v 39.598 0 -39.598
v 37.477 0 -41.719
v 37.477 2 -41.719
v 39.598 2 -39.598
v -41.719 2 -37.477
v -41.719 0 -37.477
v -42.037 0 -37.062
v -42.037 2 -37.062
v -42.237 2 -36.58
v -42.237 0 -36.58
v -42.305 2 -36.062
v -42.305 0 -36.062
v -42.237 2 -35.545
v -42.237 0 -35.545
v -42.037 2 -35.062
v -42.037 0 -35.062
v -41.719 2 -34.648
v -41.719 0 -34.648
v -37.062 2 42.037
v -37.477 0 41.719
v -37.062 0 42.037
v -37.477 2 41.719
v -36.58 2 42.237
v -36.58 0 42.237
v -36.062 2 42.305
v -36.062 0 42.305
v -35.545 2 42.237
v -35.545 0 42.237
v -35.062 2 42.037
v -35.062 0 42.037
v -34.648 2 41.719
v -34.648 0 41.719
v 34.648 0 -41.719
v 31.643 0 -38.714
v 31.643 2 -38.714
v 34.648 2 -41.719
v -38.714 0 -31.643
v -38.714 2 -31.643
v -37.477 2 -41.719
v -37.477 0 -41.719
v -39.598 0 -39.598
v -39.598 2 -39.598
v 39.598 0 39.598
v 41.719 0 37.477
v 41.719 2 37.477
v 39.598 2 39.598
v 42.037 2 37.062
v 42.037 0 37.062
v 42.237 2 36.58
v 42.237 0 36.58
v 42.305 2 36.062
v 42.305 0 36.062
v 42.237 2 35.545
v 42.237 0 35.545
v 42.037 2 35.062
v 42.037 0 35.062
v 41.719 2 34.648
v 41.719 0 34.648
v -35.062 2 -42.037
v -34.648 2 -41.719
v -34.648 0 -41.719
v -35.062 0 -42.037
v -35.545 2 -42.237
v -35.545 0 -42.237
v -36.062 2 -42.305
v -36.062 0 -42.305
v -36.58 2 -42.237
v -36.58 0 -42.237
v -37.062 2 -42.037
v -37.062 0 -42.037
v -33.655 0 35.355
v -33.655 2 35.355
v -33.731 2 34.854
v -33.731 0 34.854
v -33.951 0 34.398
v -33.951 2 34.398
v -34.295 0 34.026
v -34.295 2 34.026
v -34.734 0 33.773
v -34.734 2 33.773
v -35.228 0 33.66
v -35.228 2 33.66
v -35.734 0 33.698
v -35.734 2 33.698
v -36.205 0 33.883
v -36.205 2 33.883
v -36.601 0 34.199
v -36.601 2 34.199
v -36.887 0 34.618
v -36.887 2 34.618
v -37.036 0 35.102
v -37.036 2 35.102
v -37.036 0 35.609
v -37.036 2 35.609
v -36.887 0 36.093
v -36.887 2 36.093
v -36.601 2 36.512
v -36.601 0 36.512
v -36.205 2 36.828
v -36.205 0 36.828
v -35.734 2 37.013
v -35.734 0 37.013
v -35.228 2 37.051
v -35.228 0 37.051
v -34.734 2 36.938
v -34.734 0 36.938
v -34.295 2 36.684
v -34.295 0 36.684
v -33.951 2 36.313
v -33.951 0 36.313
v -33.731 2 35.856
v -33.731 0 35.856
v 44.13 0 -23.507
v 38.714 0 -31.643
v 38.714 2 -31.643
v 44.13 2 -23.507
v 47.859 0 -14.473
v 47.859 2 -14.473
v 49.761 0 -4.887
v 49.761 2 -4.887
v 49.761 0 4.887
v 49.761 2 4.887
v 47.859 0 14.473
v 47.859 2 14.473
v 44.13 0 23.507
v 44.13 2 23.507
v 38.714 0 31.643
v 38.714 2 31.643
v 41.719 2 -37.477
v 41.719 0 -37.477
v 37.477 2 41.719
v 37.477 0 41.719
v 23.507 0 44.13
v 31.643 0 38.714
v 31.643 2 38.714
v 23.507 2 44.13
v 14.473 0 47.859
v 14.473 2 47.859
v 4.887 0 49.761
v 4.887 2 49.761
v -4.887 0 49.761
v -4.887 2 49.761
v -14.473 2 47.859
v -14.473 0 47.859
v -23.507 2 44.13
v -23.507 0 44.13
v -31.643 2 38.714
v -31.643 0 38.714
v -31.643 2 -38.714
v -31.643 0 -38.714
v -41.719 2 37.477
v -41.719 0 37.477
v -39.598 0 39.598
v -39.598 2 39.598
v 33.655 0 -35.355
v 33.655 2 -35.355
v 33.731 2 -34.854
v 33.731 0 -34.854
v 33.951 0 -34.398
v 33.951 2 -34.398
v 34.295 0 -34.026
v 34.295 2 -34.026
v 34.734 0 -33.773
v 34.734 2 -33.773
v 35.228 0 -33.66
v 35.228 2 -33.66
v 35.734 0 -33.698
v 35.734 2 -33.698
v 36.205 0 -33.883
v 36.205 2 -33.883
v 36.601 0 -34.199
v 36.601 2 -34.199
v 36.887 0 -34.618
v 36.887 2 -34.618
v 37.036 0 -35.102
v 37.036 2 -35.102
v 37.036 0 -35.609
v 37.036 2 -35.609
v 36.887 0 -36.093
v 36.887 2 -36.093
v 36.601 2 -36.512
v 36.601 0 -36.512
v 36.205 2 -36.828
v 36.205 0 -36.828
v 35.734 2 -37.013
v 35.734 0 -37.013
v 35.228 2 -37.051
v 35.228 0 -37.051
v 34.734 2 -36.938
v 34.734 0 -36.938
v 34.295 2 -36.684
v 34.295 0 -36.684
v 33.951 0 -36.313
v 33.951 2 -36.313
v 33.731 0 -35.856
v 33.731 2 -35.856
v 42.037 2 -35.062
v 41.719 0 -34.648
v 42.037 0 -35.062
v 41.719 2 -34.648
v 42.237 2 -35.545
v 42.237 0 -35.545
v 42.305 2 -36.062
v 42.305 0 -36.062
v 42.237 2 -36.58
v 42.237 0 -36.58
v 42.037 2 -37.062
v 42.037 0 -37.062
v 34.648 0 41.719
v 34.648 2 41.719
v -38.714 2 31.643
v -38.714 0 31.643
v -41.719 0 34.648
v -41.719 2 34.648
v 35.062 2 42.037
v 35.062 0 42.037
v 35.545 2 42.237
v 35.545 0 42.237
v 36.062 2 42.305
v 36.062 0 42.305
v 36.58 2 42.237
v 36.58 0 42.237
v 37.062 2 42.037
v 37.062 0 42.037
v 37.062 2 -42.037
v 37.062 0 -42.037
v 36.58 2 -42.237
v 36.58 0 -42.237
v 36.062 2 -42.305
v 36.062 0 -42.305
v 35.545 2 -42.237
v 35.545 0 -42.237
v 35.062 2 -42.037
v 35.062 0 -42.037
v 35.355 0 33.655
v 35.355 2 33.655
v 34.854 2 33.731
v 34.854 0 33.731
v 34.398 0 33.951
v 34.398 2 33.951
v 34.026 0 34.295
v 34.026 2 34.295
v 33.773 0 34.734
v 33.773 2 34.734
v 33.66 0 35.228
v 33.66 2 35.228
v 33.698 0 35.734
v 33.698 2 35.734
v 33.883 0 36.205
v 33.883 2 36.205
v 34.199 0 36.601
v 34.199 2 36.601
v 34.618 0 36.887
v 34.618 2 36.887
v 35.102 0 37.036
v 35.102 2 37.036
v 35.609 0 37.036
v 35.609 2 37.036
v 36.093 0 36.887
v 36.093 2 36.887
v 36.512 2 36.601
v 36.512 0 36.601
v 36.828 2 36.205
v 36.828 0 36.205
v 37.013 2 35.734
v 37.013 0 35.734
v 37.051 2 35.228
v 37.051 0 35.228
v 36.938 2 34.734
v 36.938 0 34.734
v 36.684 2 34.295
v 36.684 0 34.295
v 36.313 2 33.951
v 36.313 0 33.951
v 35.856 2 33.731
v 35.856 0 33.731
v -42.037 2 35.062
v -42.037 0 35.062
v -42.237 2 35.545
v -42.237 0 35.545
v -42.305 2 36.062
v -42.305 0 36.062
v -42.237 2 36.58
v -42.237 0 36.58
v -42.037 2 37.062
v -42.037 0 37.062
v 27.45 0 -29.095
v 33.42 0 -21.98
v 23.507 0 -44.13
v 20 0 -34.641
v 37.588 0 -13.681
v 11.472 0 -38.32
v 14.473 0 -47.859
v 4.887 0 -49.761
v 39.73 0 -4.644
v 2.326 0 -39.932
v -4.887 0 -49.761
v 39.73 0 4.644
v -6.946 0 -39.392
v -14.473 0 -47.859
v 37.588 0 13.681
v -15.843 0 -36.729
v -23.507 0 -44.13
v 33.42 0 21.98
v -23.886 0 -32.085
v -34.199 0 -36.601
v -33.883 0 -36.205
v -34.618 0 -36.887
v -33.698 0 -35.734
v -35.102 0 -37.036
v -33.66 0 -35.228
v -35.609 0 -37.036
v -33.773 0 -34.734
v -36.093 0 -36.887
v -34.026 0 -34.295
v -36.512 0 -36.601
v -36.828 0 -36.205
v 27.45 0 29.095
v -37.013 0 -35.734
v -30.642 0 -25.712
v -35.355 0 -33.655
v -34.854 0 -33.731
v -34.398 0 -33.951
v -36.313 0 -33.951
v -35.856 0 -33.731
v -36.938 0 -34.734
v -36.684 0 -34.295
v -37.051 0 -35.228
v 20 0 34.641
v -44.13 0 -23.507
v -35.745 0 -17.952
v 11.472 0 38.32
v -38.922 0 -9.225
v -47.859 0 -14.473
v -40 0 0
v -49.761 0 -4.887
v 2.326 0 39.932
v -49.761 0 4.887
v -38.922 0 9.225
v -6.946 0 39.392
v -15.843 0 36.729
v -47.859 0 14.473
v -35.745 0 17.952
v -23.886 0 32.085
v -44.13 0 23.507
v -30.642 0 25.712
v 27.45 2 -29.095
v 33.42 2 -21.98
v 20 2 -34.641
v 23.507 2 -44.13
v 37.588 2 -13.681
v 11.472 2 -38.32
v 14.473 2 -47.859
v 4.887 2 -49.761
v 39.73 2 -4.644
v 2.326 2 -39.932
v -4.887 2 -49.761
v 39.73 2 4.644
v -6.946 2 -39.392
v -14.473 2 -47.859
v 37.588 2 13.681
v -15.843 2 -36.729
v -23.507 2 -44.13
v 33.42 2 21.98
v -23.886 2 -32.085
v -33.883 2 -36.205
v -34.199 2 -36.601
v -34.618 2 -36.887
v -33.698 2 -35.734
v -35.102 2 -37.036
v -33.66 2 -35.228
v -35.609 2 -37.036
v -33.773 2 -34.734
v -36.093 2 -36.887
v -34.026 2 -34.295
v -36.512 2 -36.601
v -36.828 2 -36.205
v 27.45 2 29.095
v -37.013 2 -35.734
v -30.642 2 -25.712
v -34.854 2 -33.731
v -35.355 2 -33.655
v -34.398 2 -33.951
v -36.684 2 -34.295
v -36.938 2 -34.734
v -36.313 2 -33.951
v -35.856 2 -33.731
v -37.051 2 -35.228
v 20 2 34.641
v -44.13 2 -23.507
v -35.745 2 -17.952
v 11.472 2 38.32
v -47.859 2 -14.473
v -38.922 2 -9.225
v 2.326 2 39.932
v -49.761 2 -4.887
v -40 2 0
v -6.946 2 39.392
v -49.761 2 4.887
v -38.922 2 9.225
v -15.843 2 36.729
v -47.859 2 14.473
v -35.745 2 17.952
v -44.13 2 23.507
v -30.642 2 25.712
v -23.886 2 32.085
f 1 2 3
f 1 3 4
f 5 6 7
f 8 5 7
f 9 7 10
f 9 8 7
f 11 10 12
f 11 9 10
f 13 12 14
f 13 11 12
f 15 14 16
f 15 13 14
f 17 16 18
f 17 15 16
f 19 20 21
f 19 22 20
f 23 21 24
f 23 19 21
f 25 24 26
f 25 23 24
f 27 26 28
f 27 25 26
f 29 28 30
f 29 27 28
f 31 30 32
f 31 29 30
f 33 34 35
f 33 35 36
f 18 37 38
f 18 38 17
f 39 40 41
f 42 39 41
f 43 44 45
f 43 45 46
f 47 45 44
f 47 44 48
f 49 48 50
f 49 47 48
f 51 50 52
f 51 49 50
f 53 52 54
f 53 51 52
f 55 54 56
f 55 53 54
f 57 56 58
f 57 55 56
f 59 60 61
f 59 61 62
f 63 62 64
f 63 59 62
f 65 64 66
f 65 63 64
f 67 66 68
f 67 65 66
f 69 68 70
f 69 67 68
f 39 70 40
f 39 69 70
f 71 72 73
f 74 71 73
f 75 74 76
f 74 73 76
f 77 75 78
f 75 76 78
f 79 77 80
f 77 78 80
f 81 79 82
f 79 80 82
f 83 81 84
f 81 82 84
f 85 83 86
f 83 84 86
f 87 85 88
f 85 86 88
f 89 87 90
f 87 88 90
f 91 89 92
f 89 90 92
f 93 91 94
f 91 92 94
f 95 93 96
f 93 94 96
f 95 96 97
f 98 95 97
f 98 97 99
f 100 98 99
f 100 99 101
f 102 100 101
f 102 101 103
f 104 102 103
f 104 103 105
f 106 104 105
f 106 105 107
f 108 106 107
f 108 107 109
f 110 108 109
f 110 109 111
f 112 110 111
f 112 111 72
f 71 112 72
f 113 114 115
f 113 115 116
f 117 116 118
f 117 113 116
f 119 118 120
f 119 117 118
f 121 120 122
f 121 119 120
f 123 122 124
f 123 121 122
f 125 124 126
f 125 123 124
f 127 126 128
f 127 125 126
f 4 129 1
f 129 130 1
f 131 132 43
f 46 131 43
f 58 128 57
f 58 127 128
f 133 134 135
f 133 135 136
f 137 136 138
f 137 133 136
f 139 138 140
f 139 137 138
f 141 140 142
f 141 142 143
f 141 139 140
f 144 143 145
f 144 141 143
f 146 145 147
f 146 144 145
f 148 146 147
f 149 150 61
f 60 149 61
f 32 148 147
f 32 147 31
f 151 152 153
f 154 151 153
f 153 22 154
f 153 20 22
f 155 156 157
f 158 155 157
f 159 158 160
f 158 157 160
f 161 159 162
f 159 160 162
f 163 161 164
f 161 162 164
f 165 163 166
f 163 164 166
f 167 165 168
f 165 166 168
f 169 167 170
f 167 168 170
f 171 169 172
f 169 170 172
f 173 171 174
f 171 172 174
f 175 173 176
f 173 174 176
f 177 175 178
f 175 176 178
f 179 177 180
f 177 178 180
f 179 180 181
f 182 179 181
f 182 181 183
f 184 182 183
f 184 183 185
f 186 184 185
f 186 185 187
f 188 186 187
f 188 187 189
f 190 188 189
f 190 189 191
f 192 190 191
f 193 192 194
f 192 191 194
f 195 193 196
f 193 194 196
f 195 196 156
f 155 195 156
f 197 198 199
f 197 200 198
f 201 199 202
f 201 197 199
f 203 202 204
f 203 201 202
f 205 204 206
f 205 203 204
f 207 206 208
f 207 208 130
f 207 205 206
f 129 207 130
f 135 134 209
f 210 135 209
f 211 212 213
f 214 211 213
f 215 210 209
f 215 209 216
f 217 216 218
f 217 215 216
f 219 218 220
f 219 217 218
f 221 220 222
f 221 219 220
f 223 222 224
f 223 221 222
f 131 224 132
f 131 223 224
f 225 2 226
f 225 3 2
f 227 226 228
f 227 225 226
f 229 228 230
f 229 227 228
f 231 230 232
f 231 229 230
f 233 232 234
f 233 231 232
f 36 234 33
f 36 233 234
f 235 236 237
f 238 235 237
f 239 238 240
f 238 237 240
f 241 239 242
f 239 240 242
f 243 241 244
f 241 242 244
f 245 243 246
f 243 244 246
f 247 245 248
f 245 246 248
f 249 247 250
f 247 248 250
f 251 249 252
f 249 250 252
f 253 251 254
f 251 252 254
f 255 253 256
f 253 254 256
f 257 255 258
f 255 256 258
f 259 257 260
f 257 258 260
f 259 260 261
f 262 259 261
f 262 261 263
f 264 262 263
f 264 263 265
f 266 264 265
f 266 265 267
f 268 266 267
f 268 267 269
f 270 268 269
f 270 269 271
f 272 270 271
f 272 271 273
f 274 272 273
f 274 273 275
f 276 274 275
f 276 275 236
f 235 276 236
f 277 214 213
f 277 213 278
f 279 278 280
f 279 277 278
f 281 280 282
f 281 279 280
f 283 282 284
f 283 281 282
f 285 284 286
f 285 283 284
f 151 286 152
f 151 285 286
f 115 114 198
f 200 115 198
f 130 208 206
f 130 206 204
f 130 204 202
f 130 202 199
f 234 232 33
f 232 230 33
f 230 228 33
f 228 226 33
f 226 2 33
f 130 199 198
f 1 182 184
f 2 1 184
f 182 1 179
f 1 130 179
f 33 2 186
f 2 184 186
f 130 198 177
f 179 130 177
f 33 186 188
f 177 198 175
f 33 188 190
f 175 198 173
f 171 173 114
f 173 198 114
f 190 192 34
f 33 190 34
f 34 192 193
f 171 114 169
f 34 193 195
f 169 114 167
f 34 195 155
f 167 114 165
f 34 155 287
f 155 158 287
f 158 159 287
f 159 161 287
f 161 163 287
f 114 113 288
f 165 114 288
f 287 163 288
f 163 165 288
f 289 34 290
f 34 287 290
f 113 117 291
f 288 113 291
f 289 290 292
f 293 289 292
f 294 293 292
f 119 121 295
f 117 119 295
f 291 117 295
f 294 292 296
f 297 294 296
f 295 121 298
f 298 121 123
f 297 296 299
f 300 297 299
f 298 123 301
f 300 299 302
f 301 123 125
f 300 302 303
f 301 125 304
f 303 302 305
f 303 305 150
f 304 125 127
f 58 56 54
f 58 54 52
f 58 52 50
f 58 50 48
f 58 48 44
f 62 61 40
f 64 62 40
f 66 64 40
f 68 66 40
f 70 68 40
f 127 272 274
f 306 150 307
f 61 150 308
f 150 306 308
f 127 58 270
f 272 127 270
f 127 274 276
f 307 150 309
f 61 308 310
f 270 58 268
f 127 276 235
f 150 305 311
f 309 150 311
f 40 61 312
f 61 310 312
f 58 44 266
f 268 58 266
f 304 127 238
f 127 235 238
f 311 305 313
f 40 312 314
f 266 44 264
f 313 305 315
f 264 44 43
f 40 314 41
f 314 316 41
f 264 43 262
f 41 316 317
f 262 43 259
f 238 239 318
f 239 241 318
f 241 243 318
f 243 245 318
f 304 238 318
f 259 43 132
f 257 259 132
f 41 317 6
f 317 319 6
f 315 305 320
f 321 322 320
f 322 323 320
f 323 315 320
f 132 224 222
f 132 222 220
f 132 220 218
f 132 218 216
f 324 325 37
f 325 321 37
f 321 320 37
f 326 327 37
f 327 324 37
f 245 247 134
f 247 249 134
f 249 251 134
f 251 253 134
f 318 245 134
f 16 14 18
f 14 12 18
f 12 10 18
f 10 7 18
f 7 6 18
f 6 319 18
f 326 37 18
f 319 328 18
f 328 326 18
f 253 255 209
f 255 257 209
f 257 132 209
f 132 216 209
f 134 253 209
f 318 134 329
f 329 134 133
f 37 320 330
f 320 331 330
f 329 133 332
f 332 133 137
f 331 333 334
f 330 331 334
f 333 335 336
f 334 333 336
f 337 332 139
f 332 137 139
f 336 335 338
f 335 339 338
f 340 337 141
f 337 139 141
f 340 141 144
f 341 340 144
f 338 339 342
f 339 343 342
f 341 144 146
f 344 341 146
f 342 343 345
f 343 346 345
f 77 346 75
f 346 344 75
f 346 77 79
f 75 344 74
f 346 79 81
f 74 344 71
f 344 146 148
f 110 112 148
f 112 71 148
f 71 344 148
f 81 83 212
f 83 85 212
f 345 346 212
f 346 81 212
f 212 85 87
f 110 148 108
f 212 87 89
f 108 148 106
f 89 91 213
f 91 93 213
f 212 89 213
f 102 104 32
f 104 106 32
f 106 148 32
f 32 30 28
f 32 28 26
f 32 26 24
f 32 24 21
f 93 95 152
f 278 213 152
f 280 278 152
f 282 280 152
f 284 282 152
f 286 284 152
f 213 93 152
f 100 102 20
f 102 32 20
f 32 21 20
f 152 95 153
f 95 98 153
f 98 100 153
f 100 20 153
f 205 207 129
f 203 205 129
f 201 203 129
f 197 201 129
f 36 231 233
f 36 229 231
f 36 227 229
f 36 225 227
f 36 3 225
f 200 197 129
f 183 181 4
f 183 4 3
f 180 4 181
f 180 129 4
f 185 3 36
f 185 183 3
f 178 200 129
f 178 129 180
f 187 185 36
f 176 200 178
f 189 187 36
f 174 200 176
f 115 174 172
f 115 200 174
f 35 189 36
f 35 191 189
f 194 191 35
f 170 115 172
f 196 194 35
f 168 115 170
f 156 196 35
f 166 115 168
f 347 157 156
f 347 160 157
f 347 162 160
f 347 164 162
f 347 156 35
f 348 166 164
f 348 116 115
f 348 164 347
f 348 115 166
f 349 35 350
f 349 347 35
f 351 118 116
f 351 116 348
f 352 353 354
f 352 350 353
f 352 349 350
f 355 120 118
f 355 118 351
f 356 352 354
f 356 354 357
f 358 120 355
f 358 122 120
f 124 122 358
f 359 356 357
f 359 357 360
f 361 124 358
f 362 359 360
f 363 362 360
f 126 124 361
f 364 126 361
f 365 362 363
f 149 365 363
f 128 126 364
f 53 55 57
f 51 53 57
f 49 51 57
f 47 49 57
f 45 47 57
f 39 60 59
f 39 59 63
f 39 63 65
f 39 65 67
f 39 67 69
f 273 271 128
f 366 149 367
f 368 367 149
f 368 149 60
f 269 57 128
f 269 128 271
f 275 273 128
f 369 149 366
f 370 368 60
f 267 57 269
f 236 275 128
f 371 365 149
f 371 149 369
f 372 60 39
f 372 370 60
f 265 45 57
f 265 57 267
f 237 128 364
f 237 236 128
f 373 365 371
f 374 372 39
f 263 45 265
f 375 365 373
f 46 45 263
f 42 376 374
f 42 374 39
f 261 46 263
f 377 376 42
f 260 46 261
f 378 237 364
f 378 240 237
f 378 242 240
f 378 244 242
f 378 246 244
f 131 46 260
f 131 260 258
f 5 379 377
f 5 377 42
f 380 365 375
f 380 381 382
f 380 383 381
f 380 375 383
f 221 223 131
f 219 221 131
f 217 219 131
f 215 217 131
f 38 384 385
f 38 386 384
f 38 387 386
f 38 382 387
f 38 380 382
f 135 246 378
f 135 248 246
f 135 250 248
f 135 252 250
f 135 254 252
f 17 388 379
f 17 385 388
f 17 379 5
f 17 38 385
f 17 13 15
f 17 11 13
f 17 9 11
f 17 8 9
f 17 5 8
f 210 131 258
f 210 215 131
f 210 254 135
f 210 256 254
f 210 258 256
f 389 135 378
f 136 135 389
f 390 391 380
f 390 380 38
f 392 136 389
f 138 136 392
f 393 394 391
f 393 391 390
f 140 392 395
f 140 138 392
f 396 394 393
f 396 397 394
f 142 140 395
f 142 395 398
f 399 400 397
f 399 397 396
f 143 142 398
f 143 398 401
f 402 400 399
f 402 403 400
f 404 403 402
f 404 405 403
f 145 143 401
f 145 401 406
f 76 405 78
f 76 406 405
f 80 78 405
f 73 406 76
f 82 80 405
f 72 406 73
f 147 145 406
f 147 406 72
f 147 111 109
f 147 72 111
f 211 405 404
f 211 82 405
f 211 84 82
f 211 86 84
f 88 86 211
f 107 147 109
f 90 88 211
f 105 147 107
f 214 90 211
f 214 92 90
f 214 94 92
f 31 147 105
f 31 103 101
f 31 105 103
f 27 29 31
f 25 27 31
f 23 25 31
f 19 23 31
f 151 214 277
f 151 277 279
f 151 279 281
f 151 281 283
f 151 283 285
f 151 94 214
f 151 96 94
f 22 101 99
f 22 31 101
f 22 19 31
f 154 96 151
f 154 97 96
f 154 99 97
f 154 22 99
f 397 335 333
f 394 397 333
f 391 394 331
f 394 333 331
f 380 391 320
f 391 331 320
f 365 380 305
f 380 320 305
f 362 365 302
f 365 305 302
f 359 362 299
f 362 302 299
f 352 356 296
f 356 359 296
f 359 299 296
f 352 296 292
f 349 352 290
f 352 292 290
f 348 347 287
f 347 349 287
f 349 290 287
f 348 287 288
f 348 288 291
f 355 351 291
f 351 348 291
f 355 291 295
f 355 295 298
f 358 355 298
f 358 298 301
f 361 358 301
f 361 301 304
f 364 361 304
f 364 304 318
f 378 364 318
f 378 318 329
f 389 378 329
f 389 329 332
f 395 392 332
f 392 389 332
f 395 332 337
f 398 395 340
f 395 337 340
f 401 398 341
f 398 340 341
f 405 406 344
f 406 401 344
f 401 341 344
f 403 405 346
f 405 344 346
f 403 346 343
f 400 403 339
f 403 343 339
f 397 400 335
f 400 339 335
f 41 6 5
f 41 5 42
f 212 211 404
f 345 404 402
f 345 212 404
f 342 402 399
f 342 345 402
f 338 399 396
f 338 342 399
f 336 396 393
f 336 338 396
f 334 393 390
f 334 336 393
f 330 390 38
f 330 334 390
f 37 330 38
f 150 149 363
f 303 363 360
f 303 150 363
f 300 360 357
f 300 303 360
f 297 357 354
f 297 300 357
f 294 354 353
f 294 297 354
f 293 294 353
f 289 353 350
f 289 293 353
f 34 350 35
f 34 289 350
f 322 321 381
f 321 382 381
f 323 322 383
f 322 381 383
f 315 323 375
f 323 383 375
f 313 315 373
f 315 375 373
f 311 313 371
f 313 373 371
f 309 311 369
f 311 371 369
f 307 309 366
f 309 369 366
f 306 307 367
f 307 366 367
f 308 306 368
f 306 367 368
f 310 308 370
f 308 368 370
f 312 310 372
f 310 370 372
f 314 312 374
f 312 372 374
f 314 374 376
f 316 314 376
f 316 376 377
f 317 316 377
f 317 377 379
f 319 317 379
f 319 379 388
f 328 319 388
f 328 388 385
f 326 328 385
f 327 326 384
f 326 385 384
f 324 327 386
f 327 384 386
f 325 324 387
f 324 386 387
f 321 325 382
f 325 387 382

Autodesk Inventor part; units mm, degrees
ref_plane "YZ Plane" through (0, 0, 0) normal (1, 0, 0) x (0, 1, 0)
ref_plane "XZ Plane" through (0, 0, 0) normal (0, 1, 0) x (-1, 0, 0)
ref_plane "XY Plane" through (0, 0, 0) normal (0, 0, 1) x (1, 0, 0)
sketch "Sketch1" plane through (0, 0, 0) normal (0, 1, 0) x (-1, 0, 0)
  circle A0 centre (0, 0) radius 40
  circle A1 centre (0, 0) radius 50
  dimension "d0" = 80
  dimension "d1" = 100
extrude "Extrusion1" add sketch "Sketch1" along normal blind 2
sketch "Sketch2" plane through (0, 0, 0) normal (0, 1, 0) x (-1, 0, 0)
  line L0 (0, 0) -> (-39.598, 39.598) construction
  circle A0 centre (0, 0) radius 50 construction
  line L1 (-31.6426, 38.7137) -> (-36.0624, 43.1335)
  line L2 (-36.0624, 43.1335) -> (-39.598, 39.598)
  line L3 (70, 0) -> (-70, 0) construction
  line L4 (-38.7137, 31.6426) -> (-43.1335, 36.0624)
  line L5 (-43.1335, 36.0624) -> (-39.598, 39.598)
  arc A1 (-31.6426, 38.7137) -> (-38.7137, 31.6426) centre (0, 0) ccw
  dimension "d4" = 56
  dimension "d6" = 5
  dimension "d7" = 45
extrude "Extrusion2" add sketch "Sketch2" along normal blind 2
fillet "Fillet1" radius 2 2 edges at (43.1335, 1, 36.0624) (36.0624, 1, 43.1335)
sketch "Sketch3" plane through (0, 0, 0) normal (0, -1, 0) x (1, 0, 0)
  line L0 (0, 0) -> (39.598, 39.598) construction
  line L1 (37.4767, 41.7193) -> (41.7193, 37.4767) construction
  point P0 (35.3553, 35.3553)
  dimension "d11" = 50
hole "Hole1" at (35.3553, 0, 35.3553) direction (0, 1, 0) diameter 3.4 end through all clearance for "Countersunk Flat Head Screw ISO 2009/7046" size "M3" standard "ISO"
pattern_circular "Circular Pattern1" count 4 over 360 about axis through (0, -10, 0) along (0, 1, 0) of "Hole1", "Fillet1", "Extrusion2"
properties part number "Succ_Plate"
